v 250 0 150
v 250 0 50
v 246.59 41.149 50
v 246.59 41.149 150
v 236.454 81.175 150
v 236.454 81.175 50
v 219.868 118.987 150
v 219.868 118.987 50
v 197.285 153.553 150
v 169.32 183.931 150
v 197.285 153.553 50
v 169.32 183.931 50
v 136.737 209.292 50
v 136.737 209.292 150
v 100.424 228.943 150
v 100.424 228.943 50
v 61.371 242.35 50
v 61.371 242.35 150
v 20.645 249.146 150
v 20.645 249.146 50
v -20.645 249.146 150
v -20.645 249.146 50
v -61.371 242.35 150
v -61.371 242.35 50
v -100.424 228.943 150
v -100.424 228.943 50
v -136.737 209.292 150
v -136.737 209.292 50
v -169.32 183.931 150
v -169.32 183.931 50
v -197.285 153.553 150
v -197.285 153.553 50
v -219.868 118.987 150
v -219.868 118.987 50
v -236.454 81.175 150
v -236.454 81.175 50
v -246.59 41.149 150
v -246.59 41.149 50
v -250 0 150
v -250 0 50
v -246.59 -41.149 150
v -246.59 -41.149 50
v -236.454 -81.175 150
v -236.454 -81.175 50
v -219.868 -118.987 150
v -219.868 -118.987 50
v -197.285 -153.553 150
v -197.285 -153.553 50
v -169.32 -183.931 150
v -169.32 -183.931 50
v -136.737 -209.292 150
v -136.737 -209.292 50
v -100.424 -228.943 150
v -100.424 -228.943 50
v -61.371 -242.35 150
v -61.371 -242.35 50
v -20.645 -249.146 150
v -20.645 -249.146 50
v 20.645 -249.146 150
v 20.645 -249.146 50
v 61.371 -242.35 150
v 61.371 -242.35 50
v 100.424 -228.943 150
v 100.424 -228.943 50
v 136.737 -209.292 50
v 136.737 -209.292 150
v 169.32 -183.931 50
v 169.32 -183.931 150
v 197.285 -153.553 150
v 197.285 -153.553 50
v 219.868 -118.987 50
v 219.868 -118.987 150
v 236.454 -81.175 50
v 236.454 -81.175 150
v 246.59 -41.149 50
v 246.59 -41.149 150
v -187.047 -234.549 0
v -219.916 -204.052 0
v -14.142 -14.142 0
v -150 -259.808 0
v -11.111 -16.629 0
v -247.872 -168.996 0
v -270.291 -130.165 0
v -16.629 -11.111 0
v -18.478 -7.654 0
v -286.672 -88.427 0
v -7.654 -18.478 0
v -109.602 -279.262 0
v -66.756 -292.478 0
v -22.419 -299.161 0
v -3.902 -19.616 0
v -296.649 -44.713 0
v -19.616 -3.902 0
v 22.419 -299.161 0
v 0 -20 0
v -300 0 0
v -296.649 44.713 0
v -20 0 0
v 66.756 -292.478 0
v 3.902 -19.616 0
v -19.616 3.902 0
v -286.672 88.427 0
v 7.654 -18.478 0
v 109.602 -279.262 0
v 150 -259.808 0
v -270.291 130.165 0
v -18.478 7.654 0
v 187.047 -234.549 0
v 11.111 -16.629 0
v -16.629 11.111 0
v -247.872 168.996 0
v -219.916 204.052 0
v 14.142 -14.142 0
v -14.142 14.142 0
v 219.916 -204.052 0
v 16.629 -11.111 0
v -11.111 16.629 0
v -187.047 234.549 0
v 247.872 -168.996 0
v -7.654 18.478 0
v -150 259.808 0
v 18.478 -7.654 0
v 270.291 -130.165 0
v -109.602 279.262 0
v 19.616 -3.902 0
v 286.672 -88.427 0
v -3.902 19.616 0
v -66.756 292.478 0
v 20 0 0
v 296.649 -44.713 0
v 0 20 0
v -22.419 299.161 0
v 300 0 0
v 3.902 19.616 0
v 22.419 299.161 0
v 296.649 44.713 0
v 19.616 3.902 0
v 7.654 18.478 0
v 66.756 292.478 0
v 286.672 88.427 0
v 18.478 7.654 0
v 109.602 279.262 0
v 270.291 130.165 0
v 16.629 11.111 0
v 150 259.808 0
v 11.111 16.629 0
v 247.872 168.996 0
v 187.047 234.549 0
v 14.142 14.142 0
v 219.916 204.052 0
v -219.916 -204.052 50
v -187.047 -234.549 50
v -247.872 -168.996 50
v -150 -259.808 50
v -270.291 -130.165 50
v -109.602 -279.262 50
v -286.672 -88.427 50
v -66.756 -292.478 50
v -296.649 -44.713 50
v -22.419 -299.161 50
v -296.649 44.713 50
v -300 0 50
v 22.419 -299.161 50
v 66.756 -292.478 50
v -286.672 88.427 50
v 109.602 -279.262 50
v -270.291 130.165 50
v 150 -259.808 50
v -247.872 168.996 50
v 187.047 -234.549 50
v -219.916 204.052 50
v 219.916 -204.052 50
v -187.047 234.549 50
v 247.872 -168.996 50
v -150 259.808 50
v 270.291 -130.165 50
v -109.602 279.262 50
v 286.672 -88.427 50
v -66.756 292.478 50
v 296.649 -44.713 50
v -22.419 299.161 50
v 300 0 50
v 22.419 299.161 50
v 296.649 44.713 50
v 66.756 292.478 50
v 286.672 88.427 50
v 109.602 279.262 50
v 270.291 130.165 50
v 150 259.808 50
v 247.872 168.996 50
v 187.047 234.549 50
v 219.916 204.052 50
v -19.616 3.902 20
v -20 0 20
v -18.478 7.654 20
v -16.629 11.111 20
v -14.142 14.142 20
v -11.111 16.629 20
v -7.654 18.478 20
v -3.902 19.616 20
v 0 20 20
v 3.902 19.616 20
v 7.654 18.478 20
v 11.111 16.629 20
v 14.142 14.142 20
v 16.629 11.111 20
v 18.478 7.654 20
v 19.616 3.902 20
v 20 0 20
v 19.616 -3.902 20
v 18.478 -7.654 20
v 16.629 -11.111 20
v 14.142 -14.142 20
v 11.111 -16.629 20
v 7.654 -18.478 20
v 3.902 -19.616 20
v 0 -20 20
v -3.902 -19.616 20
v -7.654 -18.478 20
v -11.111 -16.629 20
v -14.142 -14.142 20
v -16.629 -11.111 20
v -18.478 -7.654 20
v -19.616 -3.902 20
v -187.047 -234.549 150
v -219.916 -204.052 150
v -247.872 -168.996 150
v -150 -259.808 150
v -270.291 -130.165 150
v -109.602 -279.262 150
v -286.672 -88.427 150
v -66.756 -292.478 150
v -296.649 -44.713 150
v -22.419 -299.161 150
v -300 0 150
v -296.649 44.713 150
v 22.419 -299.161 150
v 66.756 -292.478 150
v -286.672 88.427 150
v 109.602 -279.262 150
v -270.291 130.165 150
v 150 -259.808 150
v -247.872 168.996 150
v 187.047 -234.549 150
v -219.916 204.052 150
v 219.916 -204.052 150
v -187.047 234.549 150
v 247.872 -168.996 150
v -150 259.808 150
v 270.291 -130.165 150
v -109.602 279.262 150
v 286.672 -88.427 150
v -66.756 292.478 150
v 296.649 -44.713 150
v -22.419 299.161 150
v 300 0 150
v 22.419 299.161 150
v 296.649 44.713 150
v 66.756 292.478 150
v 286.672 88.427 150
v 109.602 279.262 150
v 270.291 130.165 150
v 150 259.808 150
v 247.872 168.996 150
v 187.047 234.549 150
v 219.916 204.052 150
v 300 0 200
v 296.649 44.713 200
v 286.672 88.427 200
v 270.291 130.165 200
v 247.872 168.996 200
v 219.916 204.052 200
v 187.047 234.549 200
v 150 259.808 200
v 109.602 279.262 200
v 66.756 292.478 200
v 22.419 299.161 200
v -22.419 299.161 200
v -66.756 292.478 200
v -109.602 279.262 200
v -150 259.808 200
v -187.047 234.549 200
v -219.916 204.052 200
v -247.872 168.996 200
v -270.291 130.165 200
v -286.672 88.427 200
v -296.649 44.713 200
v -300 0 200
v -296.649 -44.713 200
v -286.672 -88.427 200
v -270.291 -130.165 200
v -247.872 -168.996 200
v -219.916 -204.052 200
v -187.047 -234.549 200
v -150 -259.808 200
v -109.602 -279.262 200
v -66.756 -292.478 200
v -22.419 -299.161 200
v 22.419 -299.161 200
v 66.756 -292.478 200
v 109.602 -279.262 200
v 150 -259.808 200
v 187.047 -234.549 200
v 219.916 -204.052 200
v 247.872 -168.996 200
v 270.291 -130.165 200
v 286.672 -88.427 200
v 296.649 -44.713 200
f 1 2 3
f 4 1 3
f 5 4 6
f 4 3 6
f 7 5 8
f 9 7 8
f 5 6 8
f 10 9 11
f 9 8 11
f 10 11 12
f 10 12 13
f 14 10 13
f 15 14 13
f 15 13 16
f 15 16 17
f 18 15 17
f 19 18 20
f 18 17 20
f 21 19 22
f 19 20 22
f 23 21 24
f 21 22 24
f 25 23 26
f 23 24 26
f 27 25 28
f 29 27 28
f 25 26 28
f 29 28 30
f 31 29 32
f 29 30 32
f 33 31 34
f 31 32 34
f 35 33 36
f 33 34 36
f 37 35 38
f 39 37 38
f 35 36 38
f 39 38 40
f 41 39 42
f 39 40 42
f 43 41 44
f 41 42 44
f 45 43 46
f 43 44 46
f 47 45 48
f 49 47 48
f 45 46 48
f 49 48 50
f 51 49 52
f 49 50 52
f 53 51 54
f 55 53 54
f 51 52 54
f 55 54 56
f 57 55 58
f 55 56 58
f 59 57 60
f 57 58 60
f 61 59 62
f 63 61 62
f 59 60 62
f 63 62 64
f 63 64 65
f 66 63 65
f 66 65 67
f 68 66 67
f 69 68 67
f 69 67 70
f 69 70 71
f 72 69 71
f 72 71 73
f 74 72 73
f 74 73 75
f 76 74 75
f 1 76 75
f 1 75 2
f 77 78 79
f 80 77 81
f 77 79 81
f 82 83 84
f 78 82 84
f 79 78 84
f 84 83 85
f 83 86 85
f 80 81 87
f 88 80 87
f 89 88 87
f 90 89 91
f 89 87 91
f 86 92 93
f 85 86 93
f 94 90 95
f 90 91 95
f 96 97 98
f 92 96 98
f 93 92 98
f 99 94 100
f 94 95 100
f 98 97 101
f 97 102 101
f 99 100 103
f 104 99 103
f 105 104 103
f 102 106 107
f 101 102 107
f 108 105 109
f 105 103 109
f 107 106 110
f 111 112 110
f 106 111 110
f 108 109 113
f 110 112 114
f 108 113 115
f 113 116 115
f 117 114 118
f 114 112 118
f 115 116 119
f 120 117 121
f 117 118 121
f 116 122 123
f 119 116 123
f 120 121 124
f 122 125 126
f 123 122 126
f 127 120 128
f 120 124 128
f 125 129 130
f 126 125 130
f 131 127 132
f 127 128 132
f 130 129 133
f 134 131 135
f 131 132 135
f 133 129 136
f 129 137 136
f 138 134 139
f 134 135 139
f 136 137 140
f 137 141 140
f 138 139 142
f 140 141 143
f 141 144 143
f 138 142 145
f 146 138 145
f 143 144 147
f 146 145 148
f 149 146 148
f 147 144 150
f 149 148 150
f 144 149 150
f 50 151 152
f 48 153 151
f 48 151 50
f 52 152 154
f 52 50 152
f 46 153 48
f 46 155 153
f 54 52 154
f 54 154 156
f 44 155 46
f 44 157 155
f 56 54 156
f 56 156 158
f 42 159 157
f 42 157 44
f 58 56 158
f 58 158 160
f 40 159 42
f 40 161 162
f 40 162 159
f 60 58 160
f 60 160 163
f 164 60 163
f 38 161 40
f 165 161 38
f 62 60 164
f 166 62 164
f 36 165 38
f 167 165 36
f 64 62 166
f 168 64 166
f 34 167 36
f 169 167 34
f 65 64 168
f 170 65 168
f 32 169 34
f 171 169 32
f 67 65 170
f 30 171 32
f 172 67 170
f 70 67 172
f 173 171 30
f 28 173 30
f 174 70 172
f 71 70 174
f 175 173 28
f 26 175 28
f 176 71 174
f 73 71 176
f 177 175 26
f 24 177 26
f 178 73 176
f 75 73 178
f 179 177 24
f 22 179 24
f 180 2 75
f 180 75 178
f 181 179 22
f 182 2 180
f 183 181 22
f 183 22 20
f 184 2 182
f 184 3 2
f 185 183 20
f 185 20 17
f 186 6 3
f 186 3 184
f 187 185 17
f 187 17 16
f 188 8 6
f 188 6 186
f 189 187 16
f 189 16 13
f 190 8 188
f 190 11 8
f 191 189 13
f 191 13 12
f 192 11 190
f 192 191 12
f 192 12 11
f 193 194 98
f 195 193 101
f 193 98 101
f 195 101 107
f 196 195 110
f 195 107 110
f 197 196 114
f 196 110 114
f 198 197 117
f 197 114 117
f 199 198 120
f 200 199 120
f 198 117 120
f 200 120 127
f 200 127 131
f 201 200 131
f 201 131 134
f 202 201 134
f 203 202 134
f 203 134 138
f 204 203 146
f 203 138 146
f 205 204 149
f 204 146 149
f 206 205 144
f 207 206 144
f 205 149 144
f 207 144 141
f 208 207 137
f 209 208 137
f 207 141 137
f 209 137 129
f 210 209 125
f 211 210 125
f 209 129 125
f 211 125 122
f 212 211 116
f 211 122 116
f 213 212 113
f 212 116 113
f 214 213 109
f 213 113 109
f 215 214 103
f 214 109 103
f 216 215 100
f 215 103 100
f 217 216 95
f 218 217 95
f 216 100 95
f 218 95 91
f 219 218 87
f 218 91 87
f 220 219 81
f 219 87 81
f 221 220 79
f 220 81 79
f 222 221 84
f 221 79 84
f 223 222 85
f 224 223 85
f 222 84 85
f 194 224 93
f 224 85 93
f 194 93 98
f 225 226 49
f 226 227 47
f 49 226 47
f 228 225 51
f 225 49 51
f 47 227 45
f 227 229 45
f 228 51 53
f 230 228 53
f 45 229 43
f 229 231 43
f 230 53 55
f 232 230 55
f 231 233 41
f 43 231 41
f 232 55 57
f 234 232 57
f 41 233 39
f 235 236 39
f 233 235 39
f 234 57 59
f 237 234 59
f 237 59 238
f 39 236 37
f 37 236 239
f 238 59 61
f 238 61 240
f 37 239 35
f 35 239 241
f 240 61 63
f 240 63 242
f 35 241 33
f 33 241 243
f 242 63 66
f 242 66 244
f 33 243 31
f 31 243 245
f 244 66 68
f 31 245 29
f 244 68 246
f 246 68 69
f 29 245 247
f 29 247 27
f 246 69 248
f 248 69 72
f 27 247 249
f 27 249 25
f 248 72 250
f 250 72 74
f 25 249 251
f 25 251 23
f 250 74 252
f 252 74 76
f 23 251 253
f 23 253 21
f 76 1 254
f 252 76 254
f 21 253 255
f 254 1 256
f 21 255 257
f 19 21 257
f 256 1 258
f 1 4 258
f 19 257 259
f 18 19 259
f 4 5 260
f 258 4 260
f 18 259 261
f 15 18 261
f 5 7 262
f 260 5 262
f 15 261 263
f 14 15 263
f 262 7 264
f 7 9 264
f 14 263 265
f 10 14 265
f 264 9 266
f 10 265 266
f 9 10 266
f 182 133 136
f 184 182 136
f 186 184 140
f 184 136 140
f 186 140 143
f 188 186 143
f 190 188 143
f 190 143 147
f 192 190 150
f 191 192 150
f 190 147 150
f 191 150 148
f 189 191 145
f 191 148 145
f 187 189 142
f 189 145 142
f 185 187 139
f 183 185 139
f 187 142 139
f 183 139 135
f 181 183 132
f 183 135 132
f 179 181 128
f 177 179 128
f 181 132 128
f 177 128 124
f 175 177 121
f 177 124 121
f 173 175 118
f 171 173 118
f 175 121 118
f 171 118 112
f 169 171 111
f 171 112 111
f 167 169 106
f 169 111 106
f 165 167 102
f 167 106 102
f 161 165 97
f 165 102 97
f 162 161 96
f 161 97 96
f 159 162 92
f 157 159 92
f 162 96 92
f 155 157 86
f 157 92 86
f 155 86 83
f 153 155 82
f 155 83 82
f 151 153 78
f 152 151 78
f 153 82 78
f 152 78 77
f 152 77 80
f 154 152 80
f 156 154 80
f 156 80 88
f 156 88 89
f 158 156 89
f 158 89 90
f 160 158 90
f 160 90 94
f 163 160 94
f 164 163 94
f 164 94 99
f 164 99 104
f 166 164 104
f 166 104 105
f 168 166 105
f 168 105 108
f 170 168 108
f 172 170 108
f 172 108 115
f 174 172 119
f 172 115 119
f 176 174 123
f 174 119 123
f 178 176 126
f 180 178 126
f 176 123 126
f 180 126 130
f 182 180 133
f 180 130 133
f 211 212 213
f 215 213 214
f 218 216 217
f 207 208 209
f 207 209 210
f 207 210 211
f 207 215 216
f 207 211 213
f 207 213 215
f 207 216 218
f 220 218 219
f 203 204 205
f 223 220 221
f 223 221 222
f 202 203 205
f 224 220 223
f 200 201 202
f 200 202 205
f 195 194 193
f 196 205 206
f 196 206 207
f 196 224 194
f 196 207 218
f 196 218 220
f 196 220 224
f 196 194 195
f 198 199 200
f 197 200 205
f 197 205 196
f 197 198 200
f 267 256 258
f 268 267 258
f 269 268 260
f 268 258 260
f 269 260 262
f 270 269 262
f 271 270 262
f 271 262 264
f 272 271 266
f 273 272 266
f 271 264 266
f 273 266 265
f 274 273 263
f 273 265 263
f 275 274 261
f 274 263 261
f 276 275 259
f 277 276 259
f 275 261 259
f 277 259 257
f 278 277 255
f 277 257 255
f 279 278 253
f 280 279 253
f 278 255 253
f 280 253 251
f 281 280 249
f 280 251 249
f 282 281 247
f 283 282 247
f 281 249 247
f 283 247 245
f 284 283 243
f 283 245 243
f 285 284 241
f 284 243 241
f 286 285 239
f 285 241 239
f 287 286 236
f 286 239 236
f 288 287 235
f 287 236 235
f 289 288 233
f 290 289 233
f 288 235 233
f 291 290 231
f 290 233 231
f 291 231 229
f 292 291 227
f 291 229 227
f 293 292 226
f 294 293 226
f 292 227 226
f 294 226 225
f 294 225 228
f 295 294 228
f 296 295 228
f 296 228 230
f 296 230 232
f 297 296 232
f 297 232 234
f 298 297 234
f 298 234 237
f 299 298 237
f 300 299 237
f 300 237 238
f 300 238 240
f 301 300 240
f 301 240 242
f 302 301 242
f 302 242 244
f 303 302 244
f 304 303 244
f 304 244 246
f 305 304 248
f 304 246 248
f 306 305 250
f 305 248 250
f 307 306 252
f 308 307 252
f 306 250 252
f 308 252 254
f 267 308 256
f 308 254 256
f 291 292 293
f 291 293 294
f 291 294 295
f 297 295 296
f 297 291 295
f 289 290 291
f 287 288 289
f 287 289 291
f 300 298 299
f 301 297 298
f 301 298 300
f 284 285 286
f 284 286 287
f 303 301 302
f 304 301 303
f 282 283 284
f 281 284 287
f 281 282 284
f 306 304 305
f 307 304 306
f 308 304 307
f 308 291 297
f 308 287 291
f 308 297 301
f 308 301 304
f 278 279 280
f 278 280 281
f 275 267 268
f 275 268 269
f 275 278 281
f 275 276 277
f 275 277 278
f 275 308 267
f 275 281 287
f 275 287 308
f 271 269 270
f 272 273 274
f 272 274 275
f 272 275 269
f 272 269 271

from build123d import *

# Parameters (mm, degrees)
SKETCH1_R           = 300
BOSS_EXTRUDE1_DEPTH = 50
SKETCH2_R           = 20
CUT_EXTRUDE1_DEPTH  = 20
SKETCH4_R           = 250
BOSS_EXTRUDE2_DEPTH = 100
SKETCH6_R           = 300
BOSS_EXTRUDE3_DEPTH = 50


with BuildPart() as part:
    # Sketch1 → Boss-Extrude1 (new body)
    with BuildSketch(Plane.XY):
        Circle(SKETCH1_R)
    extrude(amount=BOSS_EXTRUDE1_DEPTH)

    # Sketch2 → Cut-Extrude1 (cut)
    with BuildSketch(Plane(origin=(0, 0, 0), x_dir=(-1, 0, 0), z_dir=(0, 0, -1))):
        Circle(SKETCH2_R)
    extrude(amount=-CUT_EXTRUDE1_DEPTH, mode=Mode.SUBTRACT)

    # Sketch4 → Boss-Extrude2 (add)
    with BuildSketch(Plane.XY.offset(50)):
        Circle(SKETCH4_R)
    extrude(amount=BOSS_EXTRUDE2_DEPTH)

    # Sketch6 → Boss-Extrude3 (add)
    with BuildSketch(Plane.XY.offset(150)):
        Circle(SKETCH6_R)
    extrude(amount=BOSS_EXTRUDE3_DEPTH)


solid = part.part
